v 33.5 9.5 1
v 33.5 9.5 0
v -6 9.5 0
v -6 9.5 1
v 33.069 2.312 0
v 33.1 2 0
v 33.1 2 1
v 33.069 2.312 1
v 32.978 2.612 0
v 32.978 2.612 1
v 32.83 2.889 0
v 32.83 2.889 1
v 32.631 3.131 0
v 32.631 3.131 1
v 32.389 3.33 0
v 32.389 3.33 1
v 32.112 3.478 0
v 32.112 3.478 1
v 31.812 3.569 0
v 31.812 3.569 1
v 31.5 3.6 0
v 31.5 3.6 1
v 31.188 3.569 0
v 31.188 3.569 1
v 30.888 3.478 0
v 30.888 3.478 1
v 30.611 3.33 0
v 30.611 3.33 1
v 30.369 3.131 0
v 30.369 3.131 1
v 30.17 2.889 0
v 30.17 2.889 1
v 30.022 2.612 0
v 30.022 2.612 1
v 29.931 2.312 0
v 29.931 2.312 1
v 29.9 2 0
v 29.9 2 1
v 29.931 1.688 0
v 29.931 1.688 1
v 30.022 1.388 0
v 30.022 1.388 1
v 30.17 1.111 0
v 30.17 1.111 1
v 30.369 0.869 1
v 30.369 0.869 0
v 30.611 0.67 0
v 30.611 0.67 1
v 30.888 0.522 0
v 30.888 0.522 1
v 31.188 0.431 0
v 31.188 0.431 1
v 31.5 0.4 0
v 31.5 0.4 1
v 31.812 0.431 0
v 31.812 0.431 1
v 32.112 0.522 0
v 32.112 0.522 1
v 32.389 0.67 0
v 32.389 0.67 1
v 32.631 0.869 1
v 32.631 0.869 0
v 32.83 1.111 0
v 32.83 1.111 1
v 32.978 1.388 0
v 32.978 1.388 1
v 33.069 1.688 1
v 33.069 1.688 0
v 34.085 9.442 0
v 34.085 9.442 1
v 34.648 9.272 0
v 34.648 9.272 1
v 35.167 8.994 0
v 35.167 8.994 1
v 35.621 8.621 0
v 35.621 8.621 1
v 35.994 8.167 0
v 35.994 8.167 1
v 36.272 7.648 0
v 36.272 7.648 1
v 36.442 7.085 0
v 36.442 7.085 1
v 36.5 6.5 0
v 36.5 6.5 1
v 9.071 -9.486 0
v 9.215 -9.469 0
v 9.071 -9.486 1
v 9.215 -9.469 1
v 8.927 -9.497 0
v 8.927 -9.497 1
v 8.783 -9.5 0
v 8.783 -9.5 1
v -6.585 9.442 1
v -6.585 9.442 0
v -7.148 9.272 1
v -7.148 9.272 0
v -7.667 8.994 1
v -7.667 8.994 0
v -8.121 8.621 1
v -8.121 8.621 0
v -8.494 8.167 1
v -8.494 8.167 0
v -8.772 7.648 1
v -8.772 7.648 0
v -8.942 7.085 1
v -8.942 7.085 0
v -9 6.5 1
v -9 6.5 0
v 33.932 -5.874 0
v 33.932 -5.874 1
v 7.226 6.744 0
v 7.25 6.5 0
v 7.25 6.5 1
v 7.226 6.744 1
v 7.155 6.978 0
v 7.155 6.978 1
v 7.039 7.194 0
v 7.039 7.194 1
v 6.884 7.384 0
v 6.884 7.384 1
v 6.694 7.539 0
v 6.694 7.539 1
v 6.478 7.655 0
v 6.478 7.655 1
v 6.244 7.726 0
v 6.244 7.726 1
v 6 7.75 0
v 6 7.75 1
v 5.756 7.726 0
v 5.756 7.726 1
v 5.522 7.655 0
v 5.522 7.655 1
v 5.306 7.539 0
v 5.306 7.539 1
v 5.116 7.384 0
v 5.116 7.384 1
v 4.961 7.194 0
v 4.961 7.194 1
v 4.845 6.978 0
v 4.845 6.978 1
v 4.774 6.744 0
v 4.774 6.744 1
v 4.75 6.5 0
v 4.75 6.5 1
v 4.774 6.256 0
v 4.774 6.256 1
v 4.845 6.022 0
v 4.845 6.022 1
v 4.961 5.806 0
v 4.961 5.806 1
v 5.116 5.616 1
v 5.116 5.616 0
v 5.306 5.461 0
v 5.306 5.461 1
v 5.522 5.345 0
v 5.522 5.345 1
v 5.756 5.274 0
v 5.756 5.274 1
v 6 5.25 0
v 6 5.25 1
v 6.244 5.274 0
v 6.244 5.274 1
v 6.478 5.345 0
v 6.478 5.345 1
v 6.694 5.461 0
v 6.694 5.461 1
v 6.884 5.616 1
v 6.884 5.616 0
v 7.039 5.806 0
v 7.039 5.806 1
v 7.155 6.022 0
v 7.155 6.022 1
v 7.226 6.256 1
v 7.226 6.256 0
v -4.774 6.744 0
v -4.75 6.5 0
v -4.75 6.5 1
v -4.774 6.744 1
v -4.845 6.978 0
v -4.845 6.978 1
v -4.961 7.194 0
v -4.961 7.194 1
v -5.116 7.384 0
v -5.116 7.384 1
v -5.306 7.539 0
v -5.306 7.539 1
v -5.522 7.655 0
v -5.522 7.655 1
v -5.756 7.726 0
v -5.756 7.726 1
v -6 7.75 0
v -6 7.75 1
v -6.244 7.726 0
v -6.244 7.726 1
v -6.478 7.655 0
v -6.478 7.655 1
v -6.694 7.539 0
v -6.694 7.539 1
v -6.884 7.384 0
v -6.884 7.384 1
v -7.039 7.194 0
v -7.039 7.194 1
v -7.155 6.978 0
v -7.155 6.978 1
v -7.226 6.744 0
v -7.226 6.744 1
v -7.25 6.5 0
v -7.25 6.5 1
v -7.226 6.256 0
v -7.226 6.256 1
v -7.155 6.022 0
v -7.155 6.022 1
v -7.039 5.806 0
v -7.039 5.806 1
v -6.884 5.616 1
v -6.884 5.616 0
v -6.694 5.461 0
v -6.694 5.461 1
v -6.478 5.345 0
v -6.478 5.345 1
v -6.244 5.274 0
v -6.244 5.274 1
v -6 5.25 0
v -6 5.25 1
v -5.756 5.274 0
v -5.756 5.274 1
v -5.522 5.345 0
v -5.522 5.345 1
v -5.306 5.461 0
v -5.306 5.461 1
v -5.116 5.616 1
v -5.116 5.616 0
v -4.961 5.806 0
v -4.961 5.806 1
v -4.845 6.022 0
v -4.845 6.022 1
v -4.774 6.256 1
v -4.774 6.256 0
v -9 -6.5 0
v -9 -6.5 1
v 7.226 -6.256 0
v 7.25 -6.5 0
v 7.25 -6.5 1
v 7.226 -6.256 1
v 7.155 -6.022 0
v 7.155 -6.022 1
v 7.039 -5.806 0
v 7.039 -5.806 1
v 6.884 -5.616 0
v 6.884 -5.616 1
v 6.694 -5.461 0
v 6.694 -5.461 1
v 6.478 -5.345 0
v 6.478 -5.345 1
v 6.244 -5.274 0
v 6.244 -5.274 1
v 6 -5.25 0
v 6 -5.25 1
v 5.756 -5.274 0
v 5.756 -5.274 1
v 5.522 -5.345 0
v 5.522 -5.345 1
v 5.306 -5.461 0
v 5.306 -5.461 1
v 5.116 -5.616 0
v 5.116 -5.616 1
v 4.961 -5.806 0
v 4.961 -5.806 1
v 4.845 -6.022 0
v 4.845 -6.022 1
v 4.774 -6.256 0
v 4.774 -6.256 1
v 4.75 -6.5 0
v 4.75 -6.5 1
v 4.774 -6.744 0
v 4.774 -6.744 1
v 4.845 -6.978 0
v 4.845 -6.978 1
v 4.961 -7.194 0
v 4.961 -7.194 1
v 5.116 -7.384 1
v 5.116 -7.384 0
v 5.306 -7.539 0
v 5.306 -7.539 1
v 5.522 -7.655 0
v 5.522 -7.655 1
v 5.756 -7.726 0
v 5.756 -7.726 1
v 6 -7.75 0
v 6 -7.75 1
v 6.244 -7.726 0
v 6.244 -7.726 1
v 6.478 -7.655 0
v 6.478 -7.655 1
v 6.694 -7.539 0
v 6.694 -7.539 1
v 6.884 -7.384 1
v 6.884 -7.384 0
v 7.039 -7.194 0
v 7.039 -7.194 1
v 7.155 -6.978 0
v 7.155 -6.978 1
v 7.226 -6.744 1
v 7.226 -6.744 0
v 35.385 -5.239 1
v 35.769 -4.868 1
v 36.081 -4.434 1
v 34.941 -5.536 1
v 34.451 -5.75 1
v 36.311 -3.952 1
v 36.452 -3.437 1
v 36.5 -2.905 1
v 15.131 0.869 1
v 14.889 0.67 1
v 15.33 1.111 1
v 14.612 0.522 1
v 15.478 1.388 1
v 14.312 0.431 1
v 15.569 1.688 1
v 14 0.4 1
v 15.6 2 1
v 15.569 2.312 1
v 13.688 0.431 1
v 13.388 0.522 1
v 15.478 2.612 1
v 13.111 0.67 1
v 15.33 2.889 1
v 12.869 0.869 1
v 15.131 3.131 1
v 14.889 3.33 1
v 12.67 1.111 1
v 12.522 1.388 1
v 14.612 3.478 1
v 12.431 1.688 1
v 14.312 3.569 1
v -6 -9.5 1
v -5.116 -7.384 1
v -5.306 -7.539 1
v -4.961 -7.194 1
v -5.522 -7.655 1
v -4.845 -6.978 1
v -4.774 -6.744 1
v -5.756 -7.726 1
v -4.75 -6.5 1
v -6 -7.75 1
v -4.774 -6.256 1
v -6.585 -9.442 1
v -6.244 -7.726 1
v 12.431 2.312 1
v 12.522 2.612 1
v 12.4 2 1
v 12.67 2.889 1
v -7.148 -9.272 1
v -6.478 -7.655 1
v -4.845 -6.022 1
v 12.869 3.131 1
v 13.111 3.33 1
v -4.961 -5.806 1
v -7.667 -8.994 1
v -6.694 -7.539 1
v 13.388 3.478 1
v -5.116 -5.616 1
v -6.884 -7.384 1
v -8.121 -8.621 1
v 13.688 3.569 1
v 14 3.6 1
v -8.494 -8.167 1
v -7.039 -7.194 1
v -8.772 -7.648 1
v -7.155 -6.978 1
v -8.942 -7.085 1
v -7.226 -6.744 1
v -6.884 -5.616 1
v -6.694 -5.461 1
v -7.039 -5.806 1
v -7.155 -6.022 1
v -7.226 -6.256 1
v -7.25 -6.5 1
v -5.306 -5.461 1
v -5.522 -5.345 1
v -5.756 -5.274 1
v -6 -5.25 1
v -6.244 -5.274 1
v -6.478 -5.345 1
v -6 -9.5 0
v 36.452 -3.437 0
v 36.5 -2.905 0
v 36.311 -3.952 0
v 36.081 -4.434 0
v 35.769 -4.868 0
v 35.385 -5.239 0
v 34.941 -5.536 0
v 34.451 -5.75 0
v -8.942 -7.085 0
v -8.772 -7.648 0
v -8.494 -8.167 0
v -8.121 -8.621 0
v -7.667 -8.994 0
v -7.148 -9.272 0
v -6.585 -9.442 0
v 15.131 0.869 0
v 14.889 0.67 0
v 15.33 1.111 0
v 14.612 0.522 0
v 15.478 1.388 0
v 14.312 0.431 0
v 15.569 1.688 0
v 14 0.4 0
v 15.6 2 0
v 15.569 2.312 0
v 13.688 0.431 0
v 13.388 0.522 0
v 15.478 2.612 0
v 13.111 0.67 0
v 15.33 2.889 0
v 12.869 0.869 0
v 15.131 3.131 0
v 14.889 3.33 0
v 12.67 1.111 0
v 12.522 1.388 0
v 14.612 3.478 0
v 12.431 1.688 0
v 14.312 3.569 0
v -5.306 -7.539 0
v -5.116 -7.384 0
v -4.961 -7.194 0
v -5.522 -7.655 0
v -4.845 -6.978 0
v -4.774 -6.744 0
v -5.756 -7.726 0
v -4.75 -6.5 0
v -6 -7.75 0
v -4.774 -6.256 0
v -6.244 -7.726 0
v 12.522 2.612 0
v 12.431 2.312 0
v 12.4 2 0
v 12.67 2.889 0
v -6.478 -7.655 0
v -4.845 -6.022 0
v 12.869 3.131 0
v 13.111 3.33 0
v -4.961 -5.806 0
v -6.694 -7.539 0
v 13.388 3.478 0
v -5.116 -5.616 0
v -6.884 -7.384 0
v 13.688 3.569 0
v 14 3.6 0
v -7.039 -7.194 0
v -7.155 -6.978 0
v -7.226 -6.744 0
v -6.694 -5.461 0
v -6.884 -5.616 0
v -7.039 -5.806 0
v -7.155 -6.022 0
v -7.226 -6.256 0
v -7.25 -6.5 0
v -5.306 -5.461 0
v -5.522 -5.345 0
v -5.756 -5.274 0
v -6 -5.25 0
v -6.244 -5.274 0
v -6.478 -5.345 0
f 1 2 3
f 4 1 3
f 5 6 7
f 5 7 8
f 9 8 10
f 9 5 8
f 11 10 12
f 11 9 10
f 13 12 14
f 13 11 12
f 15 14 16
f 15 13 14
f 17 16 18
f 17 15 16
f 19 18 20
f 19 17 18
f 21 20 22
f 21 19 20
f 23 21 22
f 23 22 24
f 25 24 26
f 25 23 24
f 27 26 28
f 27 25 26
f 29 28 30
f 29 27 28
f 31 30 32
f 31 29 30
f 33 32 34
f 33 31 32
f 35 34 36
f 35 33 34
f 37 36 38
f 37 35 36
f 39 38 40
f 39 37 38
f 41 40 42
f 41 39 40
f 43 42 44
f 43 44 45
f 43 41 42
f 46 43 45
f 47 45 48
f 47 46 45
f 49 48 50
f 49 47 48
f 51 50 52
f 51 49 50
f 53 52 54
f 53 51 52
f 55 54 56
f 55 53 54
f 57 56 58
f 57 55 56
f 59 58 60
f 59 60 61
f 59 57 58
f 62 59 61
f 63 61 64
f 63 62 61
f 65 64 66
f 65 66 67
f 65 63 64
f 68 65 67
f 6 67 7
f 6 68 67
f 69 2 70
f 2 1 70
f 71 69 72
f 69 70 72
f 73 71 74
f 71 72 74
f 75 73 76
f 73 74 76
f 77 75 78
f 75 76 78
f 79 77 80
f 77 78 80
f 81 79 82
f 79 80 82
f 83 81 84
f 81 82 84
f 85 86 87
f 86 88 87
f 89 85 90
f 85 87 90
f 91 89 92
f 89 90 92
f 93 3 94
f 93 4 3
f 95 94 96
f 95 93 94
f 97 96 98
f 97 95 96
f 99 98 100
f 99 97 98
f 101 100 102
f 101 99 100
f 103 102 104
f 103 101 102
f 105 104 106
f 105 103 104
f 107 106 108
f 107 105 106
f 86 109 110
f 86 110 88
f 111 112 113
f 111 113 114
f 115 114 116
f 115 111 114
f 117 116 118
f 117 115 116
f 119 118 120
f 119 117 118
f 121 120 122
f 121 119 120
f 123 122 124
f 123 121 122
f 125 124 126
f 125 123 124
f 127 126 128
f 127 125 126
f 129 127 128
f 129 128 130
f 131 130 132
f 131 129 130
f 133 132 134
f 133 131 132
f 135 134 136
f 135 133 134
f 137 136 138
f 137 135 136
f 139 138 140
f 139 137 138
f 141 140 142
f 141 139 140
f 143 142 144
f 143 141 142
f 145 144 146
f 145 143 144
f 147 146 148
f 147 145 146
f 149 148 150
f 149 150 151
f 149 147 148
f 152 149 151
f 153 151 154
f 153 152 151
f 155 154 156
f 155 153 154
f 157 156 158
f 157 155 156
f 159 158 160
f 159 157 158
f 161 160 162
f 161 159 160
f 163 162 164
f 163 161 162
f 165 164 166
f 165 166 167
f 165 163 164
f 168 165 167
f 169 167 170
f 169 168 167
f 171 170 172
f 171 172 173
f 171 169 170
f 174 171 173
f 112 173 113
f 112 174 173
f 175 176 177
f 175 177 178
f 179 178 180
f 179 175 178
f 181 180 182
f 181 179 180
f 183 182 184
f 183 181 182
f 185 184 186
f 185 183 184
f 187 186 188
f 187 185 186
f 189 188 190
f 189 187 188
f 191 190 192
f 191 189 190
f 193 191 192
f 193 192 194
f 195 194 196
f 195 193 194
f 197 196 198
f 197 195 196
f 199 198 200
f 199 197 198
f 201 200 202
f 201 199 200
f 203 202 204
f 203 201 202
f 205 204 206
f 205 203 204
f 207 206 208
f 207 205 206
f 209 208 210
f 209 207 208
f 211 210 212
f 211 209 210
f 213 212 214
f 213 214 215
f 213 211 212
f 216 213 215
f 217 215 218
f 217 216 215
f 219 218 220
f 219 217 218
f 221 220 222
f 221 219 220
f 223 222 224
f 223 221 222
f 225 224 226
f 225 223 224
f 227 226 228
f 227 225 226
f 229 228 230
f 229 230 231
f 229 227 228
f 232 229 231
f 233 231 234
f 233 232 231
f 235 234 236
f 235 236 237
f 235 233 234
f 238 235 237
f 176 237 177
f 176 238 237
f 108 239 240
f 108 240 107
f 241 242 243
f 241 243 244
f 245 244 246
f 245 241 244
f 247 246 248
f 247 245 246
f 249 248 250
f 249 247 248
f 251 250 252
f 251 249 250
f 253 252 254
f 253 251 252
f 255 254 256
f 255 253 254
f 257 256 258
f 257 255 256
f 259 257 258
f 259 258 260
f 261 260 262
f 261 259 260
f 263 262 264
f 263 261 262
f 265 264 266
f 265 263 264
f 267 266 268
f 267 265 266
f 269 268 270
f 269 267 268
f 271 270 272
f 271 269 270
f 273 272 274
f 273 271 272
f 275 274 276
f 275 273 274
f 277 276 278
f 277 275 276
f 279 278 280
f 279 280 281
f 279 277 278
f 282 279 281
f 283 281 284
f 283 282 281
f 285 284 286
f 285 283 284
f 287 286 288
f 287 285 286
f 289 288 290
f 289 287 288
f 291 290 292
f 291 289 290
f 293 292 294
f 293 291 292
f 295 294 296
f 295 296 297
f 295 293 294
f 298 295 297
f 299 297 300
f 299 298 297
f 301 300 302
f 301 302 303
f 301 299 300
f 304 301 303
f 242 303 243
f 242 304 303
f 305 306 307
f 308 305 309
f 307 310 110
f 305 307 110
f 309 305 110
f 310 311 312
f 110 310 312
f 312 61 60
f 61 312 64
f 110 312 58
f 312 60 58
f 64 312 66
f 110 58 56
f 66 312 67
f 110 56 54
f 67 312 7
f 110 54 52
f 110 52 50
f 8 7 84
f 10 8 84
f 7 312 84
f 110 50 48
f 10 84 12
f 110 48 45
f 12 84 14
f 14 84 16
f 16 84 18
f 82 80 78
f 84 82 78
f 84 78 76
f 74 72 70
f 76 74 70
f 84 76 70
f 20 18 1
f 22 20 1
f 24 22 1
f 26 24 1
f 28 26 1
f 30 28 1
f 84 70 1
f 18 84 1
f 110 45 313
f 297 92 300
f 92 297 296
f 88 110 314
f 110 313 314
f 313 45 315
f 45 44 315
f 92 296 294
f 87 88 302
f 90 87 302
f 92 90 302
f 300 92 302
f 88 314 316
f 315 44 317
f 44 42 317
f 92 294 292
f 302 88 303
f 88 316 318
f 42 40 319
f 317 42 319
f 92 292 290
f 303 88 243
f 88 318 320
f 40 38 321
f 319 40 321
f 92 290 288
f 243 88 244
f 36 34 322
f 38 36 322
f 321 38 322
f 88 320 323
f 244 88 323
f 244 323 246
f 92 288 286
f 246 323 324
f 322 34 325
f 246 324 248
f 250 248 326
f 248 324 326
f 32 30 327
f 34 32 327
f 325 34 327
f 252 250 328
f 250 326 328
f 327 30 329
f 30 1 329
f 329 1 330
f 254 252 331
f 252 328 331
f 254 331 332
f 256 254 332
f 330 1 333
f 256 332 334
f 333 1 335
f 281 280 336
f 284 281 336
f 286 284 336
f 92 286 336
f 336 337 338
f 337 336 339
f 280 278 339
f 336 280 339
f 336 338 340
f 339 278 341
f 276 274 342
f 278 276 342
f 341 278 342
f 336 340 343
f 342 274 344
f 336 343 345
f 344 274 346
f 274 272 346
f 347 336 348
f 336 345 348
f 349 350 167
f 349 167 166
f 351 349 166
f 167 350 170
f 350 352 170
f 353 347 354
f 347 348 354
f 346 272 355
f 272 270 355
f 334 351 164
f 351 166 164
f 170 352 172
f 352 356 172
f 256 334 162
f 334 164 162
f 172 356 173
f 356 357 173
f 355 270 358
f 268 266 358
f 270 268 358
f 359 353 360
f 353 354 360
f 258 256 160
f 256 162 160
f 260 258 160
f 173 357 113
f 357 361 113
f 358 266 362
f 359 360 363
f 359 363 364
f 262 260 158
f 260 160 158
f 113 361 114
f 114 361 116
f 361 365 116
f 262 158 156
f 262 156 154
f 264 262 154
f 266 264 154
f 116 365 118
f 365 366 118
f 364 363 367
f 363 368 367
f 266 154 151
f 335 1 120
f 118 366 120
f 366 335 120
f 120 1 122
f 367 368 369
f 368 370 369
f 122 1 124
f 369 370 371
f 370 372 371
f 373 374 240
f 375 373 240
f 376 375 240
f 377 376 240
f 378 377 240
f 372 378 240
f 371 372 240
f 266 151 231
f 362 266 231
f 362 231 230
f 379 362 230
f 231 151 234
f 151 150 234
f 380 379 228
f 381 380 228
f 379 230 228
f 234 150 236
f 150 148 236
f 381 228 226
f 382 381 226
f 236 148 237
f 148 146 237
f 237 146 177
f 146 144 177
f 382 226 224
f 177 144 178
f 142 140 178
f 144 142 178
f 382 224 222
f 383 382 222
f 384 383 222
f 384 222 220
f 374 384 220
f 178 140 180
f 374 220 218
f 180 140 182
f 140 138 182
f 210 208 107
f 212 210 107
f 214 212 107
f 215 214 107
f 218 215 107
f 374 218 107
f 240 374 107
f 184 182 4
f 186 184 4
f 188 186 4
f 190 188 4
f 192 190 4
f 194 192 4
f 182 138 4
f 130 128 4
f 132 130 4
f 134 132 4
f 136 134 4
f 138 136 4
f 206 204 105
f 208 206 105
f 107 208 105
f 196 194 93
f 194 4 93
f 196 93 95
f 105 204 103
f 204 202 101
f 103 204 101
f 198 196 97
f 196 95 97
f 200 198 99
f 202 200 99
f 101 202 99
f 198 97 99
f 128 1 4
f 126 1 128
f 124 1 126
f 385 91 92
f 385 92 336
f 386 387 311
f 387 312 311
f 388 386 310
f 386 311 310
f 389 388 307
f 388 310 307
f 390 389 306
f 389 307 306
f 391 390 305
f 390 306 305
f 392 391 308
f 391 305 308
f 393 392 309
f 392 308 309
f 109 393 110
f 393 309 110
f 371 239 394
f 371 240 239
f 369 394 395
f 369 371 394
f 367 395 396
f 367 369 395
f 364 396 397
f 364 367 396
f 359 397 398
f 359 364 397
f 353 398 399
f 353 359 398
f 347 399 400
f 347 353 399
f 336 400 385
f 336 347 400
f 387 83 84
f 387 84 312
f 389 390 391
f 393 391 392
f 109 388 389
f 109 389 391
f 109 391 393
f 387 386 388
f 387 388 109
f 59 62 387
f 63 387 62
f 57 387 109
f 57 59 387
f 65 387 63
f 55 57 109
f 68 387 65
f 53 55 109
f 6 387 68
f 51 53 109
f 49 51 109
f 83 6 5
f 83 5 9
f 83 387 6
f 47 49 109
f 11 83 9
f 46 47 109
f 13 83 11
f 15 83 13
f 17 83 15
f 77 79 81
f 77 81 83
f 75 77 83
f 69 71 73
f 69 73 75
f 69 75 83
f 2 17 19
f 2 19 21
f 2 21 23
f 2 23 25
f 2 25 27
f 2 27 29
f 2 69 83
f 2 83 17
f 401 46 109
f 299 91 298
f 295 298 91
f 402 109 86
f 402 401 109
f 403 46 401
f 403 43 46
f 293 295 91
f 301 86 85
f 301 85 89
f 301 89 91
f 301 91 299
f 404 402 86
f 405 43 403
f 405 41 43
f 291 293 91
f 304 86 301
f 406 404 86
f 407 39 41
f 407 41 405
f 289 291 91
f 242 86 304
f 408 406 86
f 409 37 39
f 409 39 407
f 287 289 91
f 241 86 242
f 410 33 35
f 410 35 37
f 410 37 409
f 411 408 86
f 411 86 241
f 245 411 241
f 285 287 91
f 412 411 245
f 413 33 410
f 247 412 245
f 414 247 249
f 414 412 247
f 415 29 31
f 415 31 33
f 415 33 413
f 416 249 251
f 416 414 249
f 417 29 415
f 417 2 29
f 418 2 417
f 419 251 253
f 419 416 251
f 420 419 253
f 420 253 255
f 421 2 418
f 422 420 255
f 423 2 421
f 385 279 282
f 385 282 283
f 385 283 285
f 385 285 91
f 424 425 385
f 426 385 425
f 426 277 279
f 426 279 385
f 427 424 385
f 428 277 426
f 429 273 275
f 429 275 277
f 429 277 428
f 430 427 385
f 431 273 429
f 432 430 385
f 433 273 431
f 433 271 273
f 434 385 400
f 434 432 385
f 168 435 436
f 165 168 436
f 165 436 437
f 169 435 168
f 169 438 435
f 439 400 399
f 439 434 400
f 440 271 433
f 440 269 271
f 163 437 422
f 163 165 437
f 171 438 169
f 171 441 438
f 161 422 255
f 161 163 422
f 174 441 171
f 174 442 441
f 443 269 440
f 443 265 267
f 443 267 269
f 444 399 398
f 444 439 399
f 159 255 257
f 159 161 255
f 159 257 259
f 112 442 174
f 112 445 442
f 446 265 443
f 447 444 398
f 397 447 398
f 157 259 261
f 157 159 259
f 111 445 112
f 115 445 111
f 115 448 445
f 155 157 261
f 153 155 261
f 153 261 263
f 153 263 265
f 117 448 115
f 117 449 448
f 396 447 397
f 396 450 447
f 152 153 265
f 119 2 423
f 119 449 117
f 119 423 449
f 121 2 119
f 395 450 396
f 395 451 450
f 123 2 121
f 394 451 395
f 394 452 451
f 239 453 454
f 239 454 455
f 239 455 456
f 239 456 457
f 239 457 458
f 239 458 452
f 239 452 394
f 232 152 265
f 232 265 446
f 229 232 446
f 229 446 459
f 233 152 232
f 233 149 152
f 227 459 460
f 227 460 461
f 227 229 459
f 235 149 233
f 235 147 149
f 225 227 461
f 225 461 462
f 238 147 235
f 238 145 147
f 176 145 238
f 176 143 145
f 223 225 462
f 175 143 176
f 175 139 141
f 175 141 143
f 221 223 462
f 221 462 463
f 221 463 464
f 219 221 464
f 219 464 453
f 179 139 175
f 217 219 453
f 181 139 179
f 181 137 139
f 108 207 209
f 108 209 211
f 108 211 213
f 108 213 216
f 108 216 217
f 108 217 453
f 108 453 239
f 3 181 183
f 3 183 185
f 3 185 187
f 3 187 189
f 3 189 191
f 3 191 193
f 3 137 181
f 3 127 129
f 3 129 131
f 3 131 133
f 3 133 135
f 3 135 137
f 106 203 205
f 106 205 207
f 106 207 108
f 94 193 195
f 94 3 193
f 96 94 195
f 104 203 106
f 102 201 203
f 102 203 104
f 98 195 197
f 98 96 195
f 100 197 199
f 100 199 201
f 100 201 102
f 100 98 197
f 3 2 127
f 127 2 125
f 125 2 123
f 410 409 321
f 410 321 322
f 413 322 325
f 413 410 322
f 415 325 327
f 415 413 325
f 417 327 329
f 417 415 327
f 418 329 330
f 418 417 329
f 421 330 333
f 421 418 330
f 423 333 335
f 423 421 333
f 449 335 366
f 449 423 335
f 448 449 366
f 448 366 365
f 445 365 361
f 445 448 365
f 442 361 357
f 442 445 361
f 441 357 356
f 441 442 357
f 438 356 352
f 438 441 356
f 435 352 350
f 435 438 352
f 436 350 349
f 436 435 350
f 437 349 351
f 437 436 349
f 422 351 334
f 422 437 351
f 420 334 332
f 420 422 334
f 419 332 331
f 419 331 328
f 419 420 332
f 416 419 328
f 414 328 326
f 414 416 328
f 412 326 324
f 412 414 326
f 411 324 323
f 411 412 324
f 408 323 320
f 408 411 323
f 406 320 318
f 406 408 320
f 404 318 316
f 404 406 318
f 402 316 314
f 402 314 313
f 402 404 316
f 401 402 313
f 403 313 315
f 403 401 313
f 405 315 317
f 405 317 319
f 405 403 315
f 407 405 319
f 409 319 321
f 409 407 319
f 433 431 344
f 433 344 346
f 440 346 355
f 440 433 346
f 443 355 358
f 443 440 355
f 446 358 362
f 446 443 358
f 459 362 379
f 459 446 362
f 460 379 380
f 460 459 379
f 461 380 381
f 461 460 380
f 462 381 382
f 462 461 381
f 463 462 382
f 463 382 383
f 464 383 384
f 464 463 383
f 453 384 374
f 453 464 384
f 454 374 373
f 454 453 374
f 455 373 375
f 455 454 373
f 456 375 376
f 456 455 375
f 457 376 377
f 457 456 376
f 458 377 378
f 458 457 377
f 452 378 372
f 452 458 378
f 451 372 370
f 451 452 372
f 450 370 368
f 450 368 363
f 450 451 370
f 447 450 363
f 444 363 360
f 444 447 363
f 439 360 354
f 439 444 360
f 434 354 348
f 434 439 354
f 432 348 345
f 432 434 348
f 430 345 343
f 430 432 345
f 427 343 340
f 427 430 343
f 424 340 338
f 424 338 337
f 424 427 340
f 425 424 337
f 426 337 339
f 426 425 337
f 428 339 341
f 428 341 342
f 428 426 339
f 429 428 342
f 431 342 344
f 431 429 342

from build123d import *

# Parameters (mm, degrees)
ESBO_O1_R                = 1.25
ESBO_O1_R_2              = 1.6
RESSALTO_EXTRUS_O1_DEPTH = 1
FILETE1_R                = 3


with BuildPart() as part:
    # Esboço1 → Ressalto-extrusão1 (new body)
    with BuildSketch(Plane.XY):
        Polygon((-9, 9.5), (9, 9.5), (36.5, 9.5), (36.5, -5.5), (9, -9.5), (-9, -9.5), align=None)
        with Locations((6, -6.5)):
            Circle(ESBO_O1_R, mode=Mode.SUBTRACT)
        with Locations((6, 6.5)):
            Circle(ESBO_O1_R, mode=Mode.SUBTRACT)
        with Locations((-6, -6.5)):
            Circle(ESBO_O1_R, mode=Mode.SUBTRACT)
        with Locations((-6, 6.5)):
            Circle(ESBO_O1_R, mode=Mode.SUBTRACT)
        with Locations((31.5, 2)):
            Circle(ESBO_O1_R_2, mode=Mode.SUBTRACT)
        with Locations((14, 2)):
            Circle(ESBO_O1_R_2, mode=Mode.SUBTRACT)
    extrude(amount=RESSALTO_EXTRUS_O1_DEPTH)

    # Filete1
    filete1_edges = [part.edges().sort_by_distance(p)[0] for p in [
        (9, -9.5, 0.5),
        (-9, -9.5, 0.5),
        (-9, 9.5, 0.5),
        (36.5, 9.5, 0.5),
        (36.5, -5.5, 0.5),
    ]]
    fillet(filete1_edges, radius=FILETE1_R)


solid = part.part
